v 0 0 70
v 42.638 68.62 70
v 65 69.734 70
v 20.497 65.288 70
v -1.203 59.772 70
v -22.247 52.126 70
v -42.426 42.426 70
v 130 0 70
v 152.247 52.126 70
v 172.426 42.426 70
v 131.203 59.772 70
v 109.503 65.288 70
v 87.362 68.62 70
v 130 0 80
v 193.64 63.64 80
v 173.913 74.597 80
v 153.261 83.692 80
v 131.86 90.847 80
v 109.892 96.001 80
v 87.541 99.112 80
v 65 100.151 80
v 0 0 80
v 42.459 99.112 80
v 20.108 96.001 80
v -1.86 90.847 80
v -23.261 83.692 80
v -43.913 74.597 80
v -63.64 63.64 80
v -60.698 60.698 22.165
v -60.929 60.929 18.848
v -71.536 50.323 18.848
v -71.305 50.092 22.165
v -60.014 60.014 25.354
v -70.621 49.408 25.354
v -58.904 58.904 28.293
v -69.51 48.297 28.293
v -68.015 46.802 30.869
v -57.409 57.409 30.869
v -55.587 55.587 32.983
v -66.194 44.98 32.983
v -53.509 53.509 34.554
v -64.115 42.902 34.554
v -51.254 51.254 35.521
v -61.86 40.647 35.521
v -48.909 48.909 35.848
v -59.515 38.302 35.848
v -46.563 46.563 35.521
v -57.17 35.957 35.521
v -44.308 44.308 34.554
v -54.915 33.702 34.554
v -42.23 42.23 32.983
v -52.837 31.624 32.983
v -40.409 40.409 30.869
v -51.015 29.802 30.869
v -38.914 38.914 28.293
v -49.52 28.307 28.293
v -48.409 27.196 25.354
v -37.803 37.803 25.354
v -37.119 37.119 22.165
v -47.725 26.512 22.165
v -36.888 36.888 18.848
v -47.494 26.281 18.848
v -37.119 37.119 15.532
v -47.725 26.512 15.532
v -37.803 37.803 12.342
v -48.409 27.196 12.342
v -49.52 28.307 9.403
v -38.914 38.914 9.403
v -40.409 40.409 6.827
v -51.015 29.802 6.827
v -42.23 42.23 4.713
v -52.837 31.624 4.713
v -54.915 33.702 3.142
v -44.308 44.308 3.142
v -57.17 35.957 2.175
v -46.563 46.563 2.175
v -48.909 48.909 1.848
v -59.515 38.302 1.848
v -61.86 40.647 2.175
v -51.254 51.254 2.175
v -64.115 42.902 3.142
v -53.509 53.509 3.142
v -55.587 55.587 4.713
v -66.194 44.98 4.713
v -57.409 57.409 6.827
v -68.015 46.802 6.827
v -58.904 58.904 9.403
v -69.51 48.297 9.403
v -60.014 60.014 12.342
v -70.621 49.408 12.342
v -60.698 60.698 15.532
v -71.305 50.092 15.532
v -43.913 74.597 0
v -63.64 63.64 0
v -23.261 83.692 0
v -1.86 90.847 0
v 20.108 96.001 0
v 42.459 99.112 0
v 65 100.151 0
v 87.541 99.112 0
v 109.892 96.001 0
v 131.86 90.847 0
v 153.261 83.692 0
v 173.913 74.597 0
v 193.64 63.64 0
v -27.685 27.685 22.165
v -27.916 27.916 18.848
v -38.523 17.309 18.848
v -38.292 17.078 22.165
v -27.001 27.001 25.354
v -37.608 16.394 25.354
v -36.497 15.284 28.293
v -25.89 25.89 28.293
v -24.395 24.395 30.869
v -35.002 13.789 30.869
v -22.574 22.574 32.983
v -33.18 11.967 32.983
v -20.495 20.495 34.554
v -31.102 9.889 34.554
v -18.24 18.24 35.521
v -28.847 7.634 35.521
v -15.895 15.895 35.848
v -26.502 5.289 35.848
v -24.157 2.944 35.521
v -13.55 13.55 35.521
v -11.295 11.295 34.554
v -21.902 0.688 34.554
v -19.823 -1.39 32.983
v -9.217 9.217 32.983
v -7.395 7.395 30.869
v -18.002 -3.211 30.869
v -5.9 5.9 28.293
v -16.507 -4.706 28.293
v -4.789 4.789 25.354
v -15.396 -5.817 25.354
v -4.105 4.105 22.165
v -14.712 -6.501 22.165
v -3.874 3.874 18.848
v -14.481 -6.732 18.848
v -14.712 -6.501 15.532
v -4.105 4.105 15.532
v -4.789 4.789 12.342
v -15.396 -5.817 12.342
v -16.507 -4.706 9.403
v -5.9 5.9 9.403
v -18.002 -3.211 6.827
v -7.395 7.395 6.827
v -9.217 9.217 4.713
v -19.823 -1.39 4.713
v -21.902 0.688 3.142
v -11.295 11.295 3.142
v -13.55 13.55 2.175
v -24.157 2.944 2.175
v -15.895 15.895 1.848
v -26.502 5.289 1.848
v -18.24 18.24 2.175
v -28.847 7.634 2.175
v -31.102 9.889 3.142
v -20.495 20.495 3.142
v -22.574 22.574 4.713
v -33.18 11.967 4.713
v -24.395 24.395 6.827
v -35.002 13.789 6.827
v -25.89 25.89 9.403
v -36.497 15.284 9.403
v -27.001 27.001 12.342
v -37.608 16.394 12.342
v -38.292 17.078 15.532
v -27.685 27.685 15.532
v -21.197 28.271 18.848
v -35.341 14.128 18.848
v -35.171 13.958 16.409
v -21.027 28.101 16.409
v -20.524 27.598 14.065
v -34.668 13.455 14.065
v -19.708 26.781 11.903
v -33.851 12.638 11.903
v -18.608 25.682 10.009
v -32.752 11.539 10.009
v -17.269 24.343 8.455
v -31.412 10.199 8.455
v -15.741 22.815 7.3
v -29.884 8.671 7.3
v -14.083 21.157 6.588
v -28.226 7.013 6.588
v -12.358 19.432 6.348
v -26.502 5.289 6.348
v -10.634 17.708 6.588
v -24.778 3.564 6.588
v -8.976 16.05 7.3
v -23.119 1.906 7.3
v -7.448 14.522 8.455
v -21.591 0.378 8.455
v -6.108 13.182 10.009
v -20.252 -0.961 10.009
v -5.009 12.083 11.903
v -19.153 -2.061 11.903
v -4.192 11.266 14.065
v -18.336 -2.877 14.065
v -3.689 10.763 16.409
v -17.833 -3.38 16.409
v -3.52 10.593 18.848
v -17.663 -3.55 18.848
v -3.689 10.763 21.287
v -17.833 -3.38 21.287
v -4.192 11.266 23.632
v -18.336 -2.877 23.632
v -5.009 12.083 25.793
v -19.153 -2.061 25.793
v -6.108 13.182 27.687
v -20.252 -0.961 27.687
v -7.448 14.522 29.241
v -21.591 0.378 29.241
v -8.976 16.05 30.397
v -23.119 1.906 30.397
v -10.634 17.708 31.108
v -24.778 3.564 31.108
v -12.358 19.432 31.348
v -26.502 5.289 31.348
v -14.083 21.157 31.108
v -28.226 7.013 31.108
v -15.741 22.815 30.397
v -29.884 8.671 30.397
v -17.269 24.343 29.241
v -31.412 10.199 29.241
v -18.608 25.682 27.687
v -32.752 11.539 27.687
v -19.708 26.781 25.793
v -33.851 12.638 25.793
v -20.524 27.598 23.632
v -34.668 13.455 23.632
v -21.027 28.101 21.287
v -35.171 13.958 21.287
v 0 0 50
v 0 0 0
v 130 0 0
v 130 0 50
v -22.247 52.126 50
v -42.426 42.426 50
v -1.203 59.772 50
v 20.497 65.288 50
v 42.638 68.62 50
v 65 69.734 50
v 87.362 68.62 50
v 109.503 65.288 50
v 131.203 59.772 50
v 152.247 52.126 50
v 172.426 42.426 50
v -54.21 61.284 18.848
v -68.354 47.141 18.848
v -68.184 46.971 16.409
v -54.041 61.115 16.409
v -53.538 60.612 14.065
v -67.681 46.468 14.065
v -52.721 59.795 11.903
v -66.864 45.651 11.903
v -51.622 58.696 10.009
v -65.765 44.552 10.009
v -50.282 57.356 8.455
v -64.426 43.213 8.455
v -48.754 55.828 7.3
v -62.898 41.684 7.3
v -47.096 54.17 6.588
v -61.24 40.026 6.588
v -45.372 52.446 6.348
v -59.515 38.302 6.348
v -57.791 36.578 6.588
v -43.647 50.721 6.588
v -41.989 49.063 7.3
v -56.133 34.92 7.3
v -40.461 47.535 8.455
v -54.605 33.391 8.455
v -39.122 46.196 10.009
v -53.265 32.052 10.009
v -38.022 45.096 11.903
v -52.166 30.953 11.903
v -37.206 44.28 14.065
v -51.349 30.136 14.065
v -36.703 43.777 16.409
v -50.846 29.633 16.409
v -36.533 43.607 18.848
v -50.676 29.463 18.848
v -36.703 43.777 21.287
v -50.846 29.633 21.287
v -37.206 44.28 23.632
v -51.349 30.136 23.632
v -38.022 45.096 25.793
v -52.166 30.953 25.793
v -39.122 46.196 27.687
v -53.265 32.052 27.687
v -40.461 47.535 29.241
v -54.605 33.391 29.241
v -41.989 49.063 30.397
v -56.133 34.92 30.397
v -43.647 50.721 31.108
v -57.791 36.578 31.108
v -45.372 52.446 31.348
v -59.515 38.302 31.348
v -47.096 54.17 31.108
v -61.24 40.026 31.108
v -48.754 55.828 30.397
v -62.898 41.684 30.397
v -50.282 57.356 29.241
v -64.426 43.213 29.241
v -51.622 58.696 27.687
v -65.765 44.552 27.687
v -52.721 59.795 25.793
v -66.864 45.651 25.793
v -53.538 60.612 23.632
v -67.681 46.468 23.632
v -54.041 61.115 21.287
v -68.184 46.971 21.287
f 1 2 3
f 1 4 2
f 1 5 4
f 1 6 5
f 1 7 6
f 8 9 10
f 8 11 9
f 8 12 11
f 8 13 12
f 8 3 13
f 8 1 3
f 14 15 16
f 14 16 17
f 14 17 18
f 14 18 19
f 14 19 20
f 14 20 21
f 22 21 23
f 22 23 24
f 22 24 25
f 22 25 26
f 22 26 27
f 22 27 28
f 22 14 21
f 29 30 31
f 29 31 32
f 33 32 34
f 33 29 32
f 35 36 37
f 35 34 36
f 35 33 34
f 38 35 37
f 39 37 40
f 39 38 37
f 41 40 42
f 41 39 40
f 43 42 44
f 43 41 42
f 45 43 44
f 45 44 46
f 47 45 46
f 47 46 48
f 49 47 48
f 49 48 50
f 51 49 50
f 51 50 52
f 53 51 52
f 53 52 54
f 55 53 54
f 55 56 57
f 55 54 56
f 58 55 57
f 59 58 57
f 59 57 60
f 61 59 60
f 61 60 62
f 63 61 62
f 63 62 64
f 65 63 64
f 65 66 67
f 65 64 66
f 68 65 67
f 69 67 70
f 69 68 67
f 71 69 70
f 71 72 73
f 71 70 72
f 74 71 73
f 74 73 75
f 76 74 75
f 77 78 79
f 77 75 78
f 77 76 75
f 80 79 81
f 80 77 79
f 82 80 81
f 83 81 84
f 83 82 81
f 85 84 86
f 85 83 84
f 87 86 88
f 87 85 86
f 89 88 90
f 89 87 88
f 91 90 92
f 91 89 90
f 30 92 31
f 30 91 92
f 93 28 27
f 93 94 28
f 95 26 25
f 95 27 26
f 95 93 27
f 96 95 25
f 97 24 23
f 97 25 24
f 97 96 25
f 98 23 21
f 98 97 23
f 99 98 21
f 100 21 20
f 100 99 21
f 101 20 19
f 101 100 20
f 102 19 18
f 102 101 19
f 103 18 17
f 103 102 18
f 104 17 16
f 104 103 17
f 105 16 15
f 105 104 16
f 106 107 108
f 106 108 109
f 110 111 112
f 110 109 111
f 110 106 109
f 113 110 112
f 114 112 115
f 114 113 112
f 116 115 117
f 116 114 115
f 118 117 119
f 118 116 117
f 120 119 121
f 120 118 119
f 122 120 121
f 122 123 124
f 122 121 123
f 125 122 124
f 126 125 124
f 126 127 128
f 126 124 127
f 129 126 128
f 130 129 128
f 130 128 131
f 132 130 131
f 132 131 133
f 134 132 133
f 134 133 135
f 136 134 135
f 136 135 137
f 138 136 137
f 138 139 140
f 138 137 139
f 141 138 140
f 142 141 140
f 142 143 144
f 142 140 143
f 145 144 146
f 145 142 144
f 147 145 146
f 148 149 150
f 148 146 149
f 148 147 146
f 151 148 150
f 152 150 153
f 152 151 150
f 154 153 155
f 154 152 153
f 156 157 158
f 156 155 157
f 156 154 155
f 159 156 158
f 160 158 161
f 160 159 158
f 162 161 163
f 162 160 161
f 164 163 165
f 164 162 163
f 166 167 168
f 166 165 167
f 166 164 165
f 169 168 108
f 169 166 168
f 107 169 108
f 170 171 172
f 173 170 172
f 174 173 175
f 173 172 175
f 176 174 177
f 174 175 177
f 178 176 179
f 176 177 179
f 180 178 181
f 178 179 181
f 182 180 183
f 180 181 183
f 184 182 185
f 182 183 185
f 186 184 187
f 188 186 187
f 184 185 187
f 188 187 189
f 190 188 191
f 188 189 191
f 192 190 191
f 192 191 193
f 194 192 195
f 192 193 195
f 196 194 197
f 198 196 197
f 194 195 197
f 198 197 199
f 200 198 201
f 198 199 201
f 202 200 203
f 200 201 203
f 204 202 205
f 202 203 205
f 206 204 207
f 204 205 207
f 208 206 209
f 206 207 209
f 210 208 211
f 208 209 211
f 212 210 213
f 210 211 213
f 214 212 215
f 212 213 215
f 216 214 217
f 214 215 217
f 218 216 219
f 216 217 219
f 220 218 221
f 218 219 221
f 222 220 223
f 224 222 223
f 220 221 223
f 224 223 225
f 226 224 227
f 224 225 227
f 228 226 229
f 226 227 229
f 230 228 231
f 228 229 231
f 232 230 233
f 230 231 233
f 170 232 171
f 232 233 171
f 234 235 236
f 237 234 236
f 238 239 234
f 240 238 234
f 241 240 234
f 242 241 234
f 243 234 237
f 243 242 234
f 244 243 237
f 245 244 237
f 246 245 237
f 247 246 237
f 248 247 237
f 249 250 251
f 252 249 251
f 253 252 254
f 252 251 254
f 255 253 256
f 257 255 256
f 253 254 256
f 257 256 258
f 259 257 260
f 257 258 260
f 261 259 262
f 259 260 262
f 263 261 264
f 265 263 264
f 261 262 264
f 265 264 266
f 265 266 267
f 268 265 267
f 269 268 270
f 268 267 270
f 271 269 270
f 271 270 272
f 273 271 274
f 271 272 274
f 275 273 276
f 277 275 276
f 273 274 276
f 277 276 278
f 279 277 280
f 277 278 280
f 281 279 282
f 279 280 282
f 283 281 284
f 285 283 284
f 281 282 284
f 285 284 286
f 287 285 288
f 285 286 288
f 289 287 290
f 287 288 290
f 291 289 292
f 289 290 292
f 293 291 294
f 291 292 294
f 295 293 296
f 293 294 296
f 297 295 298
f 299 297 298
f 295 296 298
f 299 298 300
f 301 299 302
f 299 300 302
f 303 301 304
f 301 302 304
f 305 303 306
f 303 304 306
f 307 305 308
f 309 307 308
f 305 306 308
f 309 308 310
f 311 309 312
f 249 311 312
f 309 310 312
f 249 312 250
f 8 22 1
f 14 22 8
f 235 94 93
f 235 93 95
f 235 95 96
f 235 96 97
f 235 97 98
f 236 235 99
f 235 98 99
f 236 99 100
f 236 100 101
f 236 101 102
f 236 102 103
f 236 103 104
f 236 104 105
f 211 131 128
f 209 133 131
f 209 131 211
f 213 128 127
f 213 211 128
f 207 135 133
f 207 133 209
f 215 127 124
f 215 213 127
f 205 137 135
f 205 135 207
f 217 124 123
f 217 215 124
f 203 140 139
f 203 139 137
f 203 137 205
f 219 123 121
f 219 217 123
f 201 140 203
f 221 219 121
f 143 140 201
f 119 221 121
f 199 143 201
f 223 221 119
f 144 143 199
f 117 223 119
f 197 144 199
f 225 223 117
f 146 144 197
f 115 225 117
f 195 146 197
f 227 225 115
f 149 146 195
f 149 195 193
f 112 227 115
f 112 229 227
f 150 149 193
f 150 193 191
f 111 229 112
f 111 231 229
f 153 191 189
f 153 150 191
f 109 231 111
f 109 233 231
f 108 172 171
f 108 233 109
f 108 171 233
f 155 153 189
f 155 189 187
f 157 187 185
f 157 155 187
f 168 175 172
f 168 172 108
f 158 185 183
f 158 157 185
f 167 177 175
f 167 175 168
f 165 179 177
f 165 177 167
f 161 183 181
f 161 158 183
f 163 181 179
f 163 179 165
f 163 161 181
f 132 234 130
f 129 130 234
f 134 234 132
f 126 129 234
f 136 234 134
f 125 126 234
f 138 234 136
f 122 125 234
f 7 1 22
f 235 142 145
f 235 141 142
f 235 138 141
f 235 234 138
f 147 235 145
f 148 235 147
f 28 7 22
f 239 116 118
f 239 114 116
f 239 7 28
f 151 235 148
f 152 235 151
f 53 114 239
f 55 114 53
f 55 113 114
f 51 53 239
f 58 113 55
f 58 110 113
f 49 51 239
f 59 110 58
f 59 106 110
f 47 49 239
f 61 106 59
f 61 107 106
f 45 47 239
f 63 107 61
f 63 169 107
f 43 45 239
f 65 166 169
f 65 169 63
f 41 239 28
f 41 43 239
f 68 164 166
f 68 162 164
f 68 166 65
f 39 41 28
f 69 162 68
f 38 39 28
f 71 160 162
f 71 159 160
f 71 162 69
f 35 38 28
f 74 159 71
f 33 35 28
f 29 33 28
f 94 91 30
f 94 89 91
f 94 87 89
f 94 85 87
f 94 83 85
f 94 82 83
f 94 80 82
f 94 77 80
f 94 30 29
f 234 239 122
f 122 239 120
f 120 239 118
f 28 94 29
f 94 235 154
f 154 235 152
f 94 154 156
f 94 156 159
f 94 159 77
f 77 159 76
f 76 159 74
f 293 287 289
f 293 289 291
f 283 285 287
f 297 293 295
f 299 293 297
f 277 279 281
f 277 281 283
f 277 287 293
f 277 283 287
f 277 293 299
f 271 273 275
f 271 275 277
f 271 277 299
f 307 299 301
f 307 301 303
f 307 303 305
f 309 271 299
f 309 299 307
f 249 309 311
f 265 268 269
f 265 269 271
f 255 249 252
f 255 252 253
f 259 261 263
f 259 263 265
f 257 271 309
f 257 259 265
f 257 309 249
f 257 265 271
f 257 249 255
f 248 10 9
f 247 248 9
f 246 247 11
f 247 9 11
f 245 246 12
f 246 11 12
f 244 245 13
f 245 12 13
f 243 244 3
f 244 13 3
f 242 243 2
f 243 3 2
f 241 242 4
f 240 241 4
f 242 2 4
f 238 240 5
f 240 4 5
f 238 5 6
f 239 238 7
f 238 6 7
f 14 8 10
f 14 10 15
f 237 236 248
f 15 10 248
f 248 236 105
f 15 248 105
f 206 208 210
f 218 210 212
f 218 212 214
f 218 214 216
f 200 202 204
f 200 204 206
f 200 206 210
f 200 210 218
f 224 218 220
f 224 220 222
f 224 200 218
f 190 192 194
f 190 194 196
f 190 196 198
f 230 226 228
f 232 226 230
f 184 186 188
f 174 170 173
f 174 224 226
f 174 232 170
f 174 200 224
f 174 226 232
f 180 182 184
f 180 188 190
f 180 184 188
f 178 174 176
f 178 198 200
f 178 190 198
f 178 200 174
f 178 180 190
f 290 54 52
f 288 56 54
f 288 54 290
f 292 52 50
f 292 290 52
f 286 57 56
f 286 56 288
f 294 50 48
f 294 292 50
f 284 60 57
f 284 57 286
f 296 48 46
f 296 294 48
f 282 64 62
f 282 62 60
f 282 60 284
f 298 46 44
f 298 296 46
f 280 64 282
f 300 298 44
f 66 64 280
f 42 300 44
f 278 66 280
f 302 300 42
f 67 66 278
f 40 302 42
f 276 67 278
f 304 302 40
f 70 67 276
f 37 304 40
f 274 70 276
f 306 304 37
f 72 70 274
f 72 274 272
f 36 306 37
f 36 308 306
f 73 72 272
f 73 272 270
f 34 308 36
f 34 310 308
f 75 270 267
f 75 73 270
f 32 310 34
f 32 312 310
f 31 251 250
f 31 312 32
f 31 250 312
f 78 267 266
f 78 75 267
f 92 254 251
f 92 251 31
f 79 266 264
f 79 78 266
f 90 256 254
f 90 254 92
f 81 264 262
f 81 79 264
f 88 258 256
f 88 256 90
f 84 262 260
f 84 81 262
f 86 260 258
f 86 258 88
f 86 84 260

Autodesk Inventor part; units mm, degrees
sketch "Sketch1" plane through (0, 0, 0) normal (0, 0, 1) x (1, 0, 0)
  line L0 (0, 0) -> (130, 0)
  line L1 (130, 0) -> (193.6396, 63.6396)
  line L2 (0, 0) -> (-63.6396, 63.6396)
  arc A0 (193.6396, 63.6396) -> (-63.6396, 63.6396) centre (65, -144.7193) ccw
  dimension "d0" = 130
  dimension "d1" = 90
  dimension "d2" = 135
  dimension "d3" = 90
extrude "Extrusion1" add sketch "Sketch1" along normal blind 80
ref_plane "Work Plane1" through (0, 0, 80) normal (0, 0, 1) x (1, 0, 0)
sketch "Sketch2" plane through (0, 0, 80) normal (0, 0, 1) x (1, 0, 0)
  line L0 (-63.6396, 63.6396) -> (0, 0) projected
  line L1 (0, 0) -> (-42.4264, 42.4264)
  line L2 (0, 0) -> (130, 0) projected
  line L3 (0, 0) -> (130, 0)
  line L4 (130, 0) -> (172.4264, 42.4264)
  line L5 (130, 0) -> (193.6396, 63.6396) projected
  arc A0 (172.4264, 42.4264) -> (-42.4264, 42.4264) centre (65, -155.2225) ccw
  dimension "d7" = 60
  dimension "d8" = 60
extrude "Extrusion2" cut sketch "Sketch2" against normal blind 30
ref_plane "Work Plane2" through (0, 0, 0) normal (0, -1, 0) x (1, 0, 0)
sketch "Sketch4" plane through (0, 0, 0) normal (0, -1, 0) x (1, 0, 0)
  line L0 (-42.4264, 50) -> (-42.4264, 80) projected
  line L1 (-42.4264, 70) -> (172.4264, 70)
  line L2 (172.4264, 80) -> (172.4264, 50) projected
  line L3 (172.4264, 70) -> (172.4264, 80)
  line L4 (172.4264, 80) -> (-42.4264, 80)
  line L5 (193.6396, 80) -> (-63.6396, 80) projected
  line L6 (130, 50) -> (0, 50) projected
  point P0 (0, 0)
  dimension "d12" = 20
extrude "Extrusion3" add sketch "Sketch4" against normal blind 70
ref_plane "Work Plane3" through (0, 0, 0) normal (0, 0, -1) x (-1, 0, 0)
sketch "Sketch5" plane through (0, 0, 0) normal (0, 0, -1) x (-1, 0, 0)
  line L0 (-172.4264, 0) -> (-172.4264, 42.4264) projected
  line L1 (-172.4264, 42.4264) -> (-130, 0) projected
  line L2 (-172.4264, 0) -> (-172.4264, 42.4264)
  line L3 (-172.4264, 42.4264) -> (-130, 0)
  line L4 (42.4264, 0) -> (-172.4264, 0) projected
  line L5 (-130, 0) -> (-172.4264, 0)
  line L6 (-130, 0) -> (0, 0) projected
  line L7 (42.4264, 42.4264) -> (42.4264, 0)
  line L8 (63.6396, 63.6396) -> (0, 0) projected
  line L9 (42.4264, 42.4264) -> (0, 0)
  line L10 (0, 0) -> (42.4264, 0)
extrude "Extrusion4" cut sketch "Sketch5" against normal blind 80
ref_plane "Work Plane4" through (-63.6396, 63.6396, 80) normal (-0.7071, -0.7071, 0) x (-0.7071, 0.7071, 0)
sketch "Sketch6" plane through (-63.6396, 63.6396, 80) normal (-0.7071, -0.7071, 0) x (-0.7071, 0.7071, 0)
  circle A0 centre (-20.8328, 61.1519) radius 17
  circle A1 centre (-67.5207, 61.1519) radius 17
  point P0 (-90, 80)
  dimension "d19" = 34
  dimension "d21" = 34
extrude "Extrusion5" add sketch "Sketch6" along normal blind 15
sketch "Sketch7" plane through (-59.5152, 38.302, 18.8481) normal (-0.7071, -0.7071, 0) x (-0.7071, 0.7071, 0)
  circle A0 centre (0, 0) radius 12.5
  circle A1 centre (-46.6879, 0) radius 17 projected
  circle A2 centre (-46.6879, 0) radius 12.5
  point P0 (-69.1672, 18.8481)
  dimension "d24" = 25
  dimension "d25" = 25
extrude "Extrusion6" cut sketch "Sketch7" against normal blind 20 contours A0
sketch "Sketch8" plane through (-26.5019, 5.2887, 18.8481) normal (-0.7071, -0.7071, 0) x (-0.7071, 0.7071, 0)
  circle A0 centre (0, 0) radius 12.5
  point P0 (-22.4793, 18.8481)
  dimension "d28" = 25
extrude "Extrusion7" cut sketch "Sketch8" against normal blind 20
properties part number "Calliper" material "Steel, Alloy"
